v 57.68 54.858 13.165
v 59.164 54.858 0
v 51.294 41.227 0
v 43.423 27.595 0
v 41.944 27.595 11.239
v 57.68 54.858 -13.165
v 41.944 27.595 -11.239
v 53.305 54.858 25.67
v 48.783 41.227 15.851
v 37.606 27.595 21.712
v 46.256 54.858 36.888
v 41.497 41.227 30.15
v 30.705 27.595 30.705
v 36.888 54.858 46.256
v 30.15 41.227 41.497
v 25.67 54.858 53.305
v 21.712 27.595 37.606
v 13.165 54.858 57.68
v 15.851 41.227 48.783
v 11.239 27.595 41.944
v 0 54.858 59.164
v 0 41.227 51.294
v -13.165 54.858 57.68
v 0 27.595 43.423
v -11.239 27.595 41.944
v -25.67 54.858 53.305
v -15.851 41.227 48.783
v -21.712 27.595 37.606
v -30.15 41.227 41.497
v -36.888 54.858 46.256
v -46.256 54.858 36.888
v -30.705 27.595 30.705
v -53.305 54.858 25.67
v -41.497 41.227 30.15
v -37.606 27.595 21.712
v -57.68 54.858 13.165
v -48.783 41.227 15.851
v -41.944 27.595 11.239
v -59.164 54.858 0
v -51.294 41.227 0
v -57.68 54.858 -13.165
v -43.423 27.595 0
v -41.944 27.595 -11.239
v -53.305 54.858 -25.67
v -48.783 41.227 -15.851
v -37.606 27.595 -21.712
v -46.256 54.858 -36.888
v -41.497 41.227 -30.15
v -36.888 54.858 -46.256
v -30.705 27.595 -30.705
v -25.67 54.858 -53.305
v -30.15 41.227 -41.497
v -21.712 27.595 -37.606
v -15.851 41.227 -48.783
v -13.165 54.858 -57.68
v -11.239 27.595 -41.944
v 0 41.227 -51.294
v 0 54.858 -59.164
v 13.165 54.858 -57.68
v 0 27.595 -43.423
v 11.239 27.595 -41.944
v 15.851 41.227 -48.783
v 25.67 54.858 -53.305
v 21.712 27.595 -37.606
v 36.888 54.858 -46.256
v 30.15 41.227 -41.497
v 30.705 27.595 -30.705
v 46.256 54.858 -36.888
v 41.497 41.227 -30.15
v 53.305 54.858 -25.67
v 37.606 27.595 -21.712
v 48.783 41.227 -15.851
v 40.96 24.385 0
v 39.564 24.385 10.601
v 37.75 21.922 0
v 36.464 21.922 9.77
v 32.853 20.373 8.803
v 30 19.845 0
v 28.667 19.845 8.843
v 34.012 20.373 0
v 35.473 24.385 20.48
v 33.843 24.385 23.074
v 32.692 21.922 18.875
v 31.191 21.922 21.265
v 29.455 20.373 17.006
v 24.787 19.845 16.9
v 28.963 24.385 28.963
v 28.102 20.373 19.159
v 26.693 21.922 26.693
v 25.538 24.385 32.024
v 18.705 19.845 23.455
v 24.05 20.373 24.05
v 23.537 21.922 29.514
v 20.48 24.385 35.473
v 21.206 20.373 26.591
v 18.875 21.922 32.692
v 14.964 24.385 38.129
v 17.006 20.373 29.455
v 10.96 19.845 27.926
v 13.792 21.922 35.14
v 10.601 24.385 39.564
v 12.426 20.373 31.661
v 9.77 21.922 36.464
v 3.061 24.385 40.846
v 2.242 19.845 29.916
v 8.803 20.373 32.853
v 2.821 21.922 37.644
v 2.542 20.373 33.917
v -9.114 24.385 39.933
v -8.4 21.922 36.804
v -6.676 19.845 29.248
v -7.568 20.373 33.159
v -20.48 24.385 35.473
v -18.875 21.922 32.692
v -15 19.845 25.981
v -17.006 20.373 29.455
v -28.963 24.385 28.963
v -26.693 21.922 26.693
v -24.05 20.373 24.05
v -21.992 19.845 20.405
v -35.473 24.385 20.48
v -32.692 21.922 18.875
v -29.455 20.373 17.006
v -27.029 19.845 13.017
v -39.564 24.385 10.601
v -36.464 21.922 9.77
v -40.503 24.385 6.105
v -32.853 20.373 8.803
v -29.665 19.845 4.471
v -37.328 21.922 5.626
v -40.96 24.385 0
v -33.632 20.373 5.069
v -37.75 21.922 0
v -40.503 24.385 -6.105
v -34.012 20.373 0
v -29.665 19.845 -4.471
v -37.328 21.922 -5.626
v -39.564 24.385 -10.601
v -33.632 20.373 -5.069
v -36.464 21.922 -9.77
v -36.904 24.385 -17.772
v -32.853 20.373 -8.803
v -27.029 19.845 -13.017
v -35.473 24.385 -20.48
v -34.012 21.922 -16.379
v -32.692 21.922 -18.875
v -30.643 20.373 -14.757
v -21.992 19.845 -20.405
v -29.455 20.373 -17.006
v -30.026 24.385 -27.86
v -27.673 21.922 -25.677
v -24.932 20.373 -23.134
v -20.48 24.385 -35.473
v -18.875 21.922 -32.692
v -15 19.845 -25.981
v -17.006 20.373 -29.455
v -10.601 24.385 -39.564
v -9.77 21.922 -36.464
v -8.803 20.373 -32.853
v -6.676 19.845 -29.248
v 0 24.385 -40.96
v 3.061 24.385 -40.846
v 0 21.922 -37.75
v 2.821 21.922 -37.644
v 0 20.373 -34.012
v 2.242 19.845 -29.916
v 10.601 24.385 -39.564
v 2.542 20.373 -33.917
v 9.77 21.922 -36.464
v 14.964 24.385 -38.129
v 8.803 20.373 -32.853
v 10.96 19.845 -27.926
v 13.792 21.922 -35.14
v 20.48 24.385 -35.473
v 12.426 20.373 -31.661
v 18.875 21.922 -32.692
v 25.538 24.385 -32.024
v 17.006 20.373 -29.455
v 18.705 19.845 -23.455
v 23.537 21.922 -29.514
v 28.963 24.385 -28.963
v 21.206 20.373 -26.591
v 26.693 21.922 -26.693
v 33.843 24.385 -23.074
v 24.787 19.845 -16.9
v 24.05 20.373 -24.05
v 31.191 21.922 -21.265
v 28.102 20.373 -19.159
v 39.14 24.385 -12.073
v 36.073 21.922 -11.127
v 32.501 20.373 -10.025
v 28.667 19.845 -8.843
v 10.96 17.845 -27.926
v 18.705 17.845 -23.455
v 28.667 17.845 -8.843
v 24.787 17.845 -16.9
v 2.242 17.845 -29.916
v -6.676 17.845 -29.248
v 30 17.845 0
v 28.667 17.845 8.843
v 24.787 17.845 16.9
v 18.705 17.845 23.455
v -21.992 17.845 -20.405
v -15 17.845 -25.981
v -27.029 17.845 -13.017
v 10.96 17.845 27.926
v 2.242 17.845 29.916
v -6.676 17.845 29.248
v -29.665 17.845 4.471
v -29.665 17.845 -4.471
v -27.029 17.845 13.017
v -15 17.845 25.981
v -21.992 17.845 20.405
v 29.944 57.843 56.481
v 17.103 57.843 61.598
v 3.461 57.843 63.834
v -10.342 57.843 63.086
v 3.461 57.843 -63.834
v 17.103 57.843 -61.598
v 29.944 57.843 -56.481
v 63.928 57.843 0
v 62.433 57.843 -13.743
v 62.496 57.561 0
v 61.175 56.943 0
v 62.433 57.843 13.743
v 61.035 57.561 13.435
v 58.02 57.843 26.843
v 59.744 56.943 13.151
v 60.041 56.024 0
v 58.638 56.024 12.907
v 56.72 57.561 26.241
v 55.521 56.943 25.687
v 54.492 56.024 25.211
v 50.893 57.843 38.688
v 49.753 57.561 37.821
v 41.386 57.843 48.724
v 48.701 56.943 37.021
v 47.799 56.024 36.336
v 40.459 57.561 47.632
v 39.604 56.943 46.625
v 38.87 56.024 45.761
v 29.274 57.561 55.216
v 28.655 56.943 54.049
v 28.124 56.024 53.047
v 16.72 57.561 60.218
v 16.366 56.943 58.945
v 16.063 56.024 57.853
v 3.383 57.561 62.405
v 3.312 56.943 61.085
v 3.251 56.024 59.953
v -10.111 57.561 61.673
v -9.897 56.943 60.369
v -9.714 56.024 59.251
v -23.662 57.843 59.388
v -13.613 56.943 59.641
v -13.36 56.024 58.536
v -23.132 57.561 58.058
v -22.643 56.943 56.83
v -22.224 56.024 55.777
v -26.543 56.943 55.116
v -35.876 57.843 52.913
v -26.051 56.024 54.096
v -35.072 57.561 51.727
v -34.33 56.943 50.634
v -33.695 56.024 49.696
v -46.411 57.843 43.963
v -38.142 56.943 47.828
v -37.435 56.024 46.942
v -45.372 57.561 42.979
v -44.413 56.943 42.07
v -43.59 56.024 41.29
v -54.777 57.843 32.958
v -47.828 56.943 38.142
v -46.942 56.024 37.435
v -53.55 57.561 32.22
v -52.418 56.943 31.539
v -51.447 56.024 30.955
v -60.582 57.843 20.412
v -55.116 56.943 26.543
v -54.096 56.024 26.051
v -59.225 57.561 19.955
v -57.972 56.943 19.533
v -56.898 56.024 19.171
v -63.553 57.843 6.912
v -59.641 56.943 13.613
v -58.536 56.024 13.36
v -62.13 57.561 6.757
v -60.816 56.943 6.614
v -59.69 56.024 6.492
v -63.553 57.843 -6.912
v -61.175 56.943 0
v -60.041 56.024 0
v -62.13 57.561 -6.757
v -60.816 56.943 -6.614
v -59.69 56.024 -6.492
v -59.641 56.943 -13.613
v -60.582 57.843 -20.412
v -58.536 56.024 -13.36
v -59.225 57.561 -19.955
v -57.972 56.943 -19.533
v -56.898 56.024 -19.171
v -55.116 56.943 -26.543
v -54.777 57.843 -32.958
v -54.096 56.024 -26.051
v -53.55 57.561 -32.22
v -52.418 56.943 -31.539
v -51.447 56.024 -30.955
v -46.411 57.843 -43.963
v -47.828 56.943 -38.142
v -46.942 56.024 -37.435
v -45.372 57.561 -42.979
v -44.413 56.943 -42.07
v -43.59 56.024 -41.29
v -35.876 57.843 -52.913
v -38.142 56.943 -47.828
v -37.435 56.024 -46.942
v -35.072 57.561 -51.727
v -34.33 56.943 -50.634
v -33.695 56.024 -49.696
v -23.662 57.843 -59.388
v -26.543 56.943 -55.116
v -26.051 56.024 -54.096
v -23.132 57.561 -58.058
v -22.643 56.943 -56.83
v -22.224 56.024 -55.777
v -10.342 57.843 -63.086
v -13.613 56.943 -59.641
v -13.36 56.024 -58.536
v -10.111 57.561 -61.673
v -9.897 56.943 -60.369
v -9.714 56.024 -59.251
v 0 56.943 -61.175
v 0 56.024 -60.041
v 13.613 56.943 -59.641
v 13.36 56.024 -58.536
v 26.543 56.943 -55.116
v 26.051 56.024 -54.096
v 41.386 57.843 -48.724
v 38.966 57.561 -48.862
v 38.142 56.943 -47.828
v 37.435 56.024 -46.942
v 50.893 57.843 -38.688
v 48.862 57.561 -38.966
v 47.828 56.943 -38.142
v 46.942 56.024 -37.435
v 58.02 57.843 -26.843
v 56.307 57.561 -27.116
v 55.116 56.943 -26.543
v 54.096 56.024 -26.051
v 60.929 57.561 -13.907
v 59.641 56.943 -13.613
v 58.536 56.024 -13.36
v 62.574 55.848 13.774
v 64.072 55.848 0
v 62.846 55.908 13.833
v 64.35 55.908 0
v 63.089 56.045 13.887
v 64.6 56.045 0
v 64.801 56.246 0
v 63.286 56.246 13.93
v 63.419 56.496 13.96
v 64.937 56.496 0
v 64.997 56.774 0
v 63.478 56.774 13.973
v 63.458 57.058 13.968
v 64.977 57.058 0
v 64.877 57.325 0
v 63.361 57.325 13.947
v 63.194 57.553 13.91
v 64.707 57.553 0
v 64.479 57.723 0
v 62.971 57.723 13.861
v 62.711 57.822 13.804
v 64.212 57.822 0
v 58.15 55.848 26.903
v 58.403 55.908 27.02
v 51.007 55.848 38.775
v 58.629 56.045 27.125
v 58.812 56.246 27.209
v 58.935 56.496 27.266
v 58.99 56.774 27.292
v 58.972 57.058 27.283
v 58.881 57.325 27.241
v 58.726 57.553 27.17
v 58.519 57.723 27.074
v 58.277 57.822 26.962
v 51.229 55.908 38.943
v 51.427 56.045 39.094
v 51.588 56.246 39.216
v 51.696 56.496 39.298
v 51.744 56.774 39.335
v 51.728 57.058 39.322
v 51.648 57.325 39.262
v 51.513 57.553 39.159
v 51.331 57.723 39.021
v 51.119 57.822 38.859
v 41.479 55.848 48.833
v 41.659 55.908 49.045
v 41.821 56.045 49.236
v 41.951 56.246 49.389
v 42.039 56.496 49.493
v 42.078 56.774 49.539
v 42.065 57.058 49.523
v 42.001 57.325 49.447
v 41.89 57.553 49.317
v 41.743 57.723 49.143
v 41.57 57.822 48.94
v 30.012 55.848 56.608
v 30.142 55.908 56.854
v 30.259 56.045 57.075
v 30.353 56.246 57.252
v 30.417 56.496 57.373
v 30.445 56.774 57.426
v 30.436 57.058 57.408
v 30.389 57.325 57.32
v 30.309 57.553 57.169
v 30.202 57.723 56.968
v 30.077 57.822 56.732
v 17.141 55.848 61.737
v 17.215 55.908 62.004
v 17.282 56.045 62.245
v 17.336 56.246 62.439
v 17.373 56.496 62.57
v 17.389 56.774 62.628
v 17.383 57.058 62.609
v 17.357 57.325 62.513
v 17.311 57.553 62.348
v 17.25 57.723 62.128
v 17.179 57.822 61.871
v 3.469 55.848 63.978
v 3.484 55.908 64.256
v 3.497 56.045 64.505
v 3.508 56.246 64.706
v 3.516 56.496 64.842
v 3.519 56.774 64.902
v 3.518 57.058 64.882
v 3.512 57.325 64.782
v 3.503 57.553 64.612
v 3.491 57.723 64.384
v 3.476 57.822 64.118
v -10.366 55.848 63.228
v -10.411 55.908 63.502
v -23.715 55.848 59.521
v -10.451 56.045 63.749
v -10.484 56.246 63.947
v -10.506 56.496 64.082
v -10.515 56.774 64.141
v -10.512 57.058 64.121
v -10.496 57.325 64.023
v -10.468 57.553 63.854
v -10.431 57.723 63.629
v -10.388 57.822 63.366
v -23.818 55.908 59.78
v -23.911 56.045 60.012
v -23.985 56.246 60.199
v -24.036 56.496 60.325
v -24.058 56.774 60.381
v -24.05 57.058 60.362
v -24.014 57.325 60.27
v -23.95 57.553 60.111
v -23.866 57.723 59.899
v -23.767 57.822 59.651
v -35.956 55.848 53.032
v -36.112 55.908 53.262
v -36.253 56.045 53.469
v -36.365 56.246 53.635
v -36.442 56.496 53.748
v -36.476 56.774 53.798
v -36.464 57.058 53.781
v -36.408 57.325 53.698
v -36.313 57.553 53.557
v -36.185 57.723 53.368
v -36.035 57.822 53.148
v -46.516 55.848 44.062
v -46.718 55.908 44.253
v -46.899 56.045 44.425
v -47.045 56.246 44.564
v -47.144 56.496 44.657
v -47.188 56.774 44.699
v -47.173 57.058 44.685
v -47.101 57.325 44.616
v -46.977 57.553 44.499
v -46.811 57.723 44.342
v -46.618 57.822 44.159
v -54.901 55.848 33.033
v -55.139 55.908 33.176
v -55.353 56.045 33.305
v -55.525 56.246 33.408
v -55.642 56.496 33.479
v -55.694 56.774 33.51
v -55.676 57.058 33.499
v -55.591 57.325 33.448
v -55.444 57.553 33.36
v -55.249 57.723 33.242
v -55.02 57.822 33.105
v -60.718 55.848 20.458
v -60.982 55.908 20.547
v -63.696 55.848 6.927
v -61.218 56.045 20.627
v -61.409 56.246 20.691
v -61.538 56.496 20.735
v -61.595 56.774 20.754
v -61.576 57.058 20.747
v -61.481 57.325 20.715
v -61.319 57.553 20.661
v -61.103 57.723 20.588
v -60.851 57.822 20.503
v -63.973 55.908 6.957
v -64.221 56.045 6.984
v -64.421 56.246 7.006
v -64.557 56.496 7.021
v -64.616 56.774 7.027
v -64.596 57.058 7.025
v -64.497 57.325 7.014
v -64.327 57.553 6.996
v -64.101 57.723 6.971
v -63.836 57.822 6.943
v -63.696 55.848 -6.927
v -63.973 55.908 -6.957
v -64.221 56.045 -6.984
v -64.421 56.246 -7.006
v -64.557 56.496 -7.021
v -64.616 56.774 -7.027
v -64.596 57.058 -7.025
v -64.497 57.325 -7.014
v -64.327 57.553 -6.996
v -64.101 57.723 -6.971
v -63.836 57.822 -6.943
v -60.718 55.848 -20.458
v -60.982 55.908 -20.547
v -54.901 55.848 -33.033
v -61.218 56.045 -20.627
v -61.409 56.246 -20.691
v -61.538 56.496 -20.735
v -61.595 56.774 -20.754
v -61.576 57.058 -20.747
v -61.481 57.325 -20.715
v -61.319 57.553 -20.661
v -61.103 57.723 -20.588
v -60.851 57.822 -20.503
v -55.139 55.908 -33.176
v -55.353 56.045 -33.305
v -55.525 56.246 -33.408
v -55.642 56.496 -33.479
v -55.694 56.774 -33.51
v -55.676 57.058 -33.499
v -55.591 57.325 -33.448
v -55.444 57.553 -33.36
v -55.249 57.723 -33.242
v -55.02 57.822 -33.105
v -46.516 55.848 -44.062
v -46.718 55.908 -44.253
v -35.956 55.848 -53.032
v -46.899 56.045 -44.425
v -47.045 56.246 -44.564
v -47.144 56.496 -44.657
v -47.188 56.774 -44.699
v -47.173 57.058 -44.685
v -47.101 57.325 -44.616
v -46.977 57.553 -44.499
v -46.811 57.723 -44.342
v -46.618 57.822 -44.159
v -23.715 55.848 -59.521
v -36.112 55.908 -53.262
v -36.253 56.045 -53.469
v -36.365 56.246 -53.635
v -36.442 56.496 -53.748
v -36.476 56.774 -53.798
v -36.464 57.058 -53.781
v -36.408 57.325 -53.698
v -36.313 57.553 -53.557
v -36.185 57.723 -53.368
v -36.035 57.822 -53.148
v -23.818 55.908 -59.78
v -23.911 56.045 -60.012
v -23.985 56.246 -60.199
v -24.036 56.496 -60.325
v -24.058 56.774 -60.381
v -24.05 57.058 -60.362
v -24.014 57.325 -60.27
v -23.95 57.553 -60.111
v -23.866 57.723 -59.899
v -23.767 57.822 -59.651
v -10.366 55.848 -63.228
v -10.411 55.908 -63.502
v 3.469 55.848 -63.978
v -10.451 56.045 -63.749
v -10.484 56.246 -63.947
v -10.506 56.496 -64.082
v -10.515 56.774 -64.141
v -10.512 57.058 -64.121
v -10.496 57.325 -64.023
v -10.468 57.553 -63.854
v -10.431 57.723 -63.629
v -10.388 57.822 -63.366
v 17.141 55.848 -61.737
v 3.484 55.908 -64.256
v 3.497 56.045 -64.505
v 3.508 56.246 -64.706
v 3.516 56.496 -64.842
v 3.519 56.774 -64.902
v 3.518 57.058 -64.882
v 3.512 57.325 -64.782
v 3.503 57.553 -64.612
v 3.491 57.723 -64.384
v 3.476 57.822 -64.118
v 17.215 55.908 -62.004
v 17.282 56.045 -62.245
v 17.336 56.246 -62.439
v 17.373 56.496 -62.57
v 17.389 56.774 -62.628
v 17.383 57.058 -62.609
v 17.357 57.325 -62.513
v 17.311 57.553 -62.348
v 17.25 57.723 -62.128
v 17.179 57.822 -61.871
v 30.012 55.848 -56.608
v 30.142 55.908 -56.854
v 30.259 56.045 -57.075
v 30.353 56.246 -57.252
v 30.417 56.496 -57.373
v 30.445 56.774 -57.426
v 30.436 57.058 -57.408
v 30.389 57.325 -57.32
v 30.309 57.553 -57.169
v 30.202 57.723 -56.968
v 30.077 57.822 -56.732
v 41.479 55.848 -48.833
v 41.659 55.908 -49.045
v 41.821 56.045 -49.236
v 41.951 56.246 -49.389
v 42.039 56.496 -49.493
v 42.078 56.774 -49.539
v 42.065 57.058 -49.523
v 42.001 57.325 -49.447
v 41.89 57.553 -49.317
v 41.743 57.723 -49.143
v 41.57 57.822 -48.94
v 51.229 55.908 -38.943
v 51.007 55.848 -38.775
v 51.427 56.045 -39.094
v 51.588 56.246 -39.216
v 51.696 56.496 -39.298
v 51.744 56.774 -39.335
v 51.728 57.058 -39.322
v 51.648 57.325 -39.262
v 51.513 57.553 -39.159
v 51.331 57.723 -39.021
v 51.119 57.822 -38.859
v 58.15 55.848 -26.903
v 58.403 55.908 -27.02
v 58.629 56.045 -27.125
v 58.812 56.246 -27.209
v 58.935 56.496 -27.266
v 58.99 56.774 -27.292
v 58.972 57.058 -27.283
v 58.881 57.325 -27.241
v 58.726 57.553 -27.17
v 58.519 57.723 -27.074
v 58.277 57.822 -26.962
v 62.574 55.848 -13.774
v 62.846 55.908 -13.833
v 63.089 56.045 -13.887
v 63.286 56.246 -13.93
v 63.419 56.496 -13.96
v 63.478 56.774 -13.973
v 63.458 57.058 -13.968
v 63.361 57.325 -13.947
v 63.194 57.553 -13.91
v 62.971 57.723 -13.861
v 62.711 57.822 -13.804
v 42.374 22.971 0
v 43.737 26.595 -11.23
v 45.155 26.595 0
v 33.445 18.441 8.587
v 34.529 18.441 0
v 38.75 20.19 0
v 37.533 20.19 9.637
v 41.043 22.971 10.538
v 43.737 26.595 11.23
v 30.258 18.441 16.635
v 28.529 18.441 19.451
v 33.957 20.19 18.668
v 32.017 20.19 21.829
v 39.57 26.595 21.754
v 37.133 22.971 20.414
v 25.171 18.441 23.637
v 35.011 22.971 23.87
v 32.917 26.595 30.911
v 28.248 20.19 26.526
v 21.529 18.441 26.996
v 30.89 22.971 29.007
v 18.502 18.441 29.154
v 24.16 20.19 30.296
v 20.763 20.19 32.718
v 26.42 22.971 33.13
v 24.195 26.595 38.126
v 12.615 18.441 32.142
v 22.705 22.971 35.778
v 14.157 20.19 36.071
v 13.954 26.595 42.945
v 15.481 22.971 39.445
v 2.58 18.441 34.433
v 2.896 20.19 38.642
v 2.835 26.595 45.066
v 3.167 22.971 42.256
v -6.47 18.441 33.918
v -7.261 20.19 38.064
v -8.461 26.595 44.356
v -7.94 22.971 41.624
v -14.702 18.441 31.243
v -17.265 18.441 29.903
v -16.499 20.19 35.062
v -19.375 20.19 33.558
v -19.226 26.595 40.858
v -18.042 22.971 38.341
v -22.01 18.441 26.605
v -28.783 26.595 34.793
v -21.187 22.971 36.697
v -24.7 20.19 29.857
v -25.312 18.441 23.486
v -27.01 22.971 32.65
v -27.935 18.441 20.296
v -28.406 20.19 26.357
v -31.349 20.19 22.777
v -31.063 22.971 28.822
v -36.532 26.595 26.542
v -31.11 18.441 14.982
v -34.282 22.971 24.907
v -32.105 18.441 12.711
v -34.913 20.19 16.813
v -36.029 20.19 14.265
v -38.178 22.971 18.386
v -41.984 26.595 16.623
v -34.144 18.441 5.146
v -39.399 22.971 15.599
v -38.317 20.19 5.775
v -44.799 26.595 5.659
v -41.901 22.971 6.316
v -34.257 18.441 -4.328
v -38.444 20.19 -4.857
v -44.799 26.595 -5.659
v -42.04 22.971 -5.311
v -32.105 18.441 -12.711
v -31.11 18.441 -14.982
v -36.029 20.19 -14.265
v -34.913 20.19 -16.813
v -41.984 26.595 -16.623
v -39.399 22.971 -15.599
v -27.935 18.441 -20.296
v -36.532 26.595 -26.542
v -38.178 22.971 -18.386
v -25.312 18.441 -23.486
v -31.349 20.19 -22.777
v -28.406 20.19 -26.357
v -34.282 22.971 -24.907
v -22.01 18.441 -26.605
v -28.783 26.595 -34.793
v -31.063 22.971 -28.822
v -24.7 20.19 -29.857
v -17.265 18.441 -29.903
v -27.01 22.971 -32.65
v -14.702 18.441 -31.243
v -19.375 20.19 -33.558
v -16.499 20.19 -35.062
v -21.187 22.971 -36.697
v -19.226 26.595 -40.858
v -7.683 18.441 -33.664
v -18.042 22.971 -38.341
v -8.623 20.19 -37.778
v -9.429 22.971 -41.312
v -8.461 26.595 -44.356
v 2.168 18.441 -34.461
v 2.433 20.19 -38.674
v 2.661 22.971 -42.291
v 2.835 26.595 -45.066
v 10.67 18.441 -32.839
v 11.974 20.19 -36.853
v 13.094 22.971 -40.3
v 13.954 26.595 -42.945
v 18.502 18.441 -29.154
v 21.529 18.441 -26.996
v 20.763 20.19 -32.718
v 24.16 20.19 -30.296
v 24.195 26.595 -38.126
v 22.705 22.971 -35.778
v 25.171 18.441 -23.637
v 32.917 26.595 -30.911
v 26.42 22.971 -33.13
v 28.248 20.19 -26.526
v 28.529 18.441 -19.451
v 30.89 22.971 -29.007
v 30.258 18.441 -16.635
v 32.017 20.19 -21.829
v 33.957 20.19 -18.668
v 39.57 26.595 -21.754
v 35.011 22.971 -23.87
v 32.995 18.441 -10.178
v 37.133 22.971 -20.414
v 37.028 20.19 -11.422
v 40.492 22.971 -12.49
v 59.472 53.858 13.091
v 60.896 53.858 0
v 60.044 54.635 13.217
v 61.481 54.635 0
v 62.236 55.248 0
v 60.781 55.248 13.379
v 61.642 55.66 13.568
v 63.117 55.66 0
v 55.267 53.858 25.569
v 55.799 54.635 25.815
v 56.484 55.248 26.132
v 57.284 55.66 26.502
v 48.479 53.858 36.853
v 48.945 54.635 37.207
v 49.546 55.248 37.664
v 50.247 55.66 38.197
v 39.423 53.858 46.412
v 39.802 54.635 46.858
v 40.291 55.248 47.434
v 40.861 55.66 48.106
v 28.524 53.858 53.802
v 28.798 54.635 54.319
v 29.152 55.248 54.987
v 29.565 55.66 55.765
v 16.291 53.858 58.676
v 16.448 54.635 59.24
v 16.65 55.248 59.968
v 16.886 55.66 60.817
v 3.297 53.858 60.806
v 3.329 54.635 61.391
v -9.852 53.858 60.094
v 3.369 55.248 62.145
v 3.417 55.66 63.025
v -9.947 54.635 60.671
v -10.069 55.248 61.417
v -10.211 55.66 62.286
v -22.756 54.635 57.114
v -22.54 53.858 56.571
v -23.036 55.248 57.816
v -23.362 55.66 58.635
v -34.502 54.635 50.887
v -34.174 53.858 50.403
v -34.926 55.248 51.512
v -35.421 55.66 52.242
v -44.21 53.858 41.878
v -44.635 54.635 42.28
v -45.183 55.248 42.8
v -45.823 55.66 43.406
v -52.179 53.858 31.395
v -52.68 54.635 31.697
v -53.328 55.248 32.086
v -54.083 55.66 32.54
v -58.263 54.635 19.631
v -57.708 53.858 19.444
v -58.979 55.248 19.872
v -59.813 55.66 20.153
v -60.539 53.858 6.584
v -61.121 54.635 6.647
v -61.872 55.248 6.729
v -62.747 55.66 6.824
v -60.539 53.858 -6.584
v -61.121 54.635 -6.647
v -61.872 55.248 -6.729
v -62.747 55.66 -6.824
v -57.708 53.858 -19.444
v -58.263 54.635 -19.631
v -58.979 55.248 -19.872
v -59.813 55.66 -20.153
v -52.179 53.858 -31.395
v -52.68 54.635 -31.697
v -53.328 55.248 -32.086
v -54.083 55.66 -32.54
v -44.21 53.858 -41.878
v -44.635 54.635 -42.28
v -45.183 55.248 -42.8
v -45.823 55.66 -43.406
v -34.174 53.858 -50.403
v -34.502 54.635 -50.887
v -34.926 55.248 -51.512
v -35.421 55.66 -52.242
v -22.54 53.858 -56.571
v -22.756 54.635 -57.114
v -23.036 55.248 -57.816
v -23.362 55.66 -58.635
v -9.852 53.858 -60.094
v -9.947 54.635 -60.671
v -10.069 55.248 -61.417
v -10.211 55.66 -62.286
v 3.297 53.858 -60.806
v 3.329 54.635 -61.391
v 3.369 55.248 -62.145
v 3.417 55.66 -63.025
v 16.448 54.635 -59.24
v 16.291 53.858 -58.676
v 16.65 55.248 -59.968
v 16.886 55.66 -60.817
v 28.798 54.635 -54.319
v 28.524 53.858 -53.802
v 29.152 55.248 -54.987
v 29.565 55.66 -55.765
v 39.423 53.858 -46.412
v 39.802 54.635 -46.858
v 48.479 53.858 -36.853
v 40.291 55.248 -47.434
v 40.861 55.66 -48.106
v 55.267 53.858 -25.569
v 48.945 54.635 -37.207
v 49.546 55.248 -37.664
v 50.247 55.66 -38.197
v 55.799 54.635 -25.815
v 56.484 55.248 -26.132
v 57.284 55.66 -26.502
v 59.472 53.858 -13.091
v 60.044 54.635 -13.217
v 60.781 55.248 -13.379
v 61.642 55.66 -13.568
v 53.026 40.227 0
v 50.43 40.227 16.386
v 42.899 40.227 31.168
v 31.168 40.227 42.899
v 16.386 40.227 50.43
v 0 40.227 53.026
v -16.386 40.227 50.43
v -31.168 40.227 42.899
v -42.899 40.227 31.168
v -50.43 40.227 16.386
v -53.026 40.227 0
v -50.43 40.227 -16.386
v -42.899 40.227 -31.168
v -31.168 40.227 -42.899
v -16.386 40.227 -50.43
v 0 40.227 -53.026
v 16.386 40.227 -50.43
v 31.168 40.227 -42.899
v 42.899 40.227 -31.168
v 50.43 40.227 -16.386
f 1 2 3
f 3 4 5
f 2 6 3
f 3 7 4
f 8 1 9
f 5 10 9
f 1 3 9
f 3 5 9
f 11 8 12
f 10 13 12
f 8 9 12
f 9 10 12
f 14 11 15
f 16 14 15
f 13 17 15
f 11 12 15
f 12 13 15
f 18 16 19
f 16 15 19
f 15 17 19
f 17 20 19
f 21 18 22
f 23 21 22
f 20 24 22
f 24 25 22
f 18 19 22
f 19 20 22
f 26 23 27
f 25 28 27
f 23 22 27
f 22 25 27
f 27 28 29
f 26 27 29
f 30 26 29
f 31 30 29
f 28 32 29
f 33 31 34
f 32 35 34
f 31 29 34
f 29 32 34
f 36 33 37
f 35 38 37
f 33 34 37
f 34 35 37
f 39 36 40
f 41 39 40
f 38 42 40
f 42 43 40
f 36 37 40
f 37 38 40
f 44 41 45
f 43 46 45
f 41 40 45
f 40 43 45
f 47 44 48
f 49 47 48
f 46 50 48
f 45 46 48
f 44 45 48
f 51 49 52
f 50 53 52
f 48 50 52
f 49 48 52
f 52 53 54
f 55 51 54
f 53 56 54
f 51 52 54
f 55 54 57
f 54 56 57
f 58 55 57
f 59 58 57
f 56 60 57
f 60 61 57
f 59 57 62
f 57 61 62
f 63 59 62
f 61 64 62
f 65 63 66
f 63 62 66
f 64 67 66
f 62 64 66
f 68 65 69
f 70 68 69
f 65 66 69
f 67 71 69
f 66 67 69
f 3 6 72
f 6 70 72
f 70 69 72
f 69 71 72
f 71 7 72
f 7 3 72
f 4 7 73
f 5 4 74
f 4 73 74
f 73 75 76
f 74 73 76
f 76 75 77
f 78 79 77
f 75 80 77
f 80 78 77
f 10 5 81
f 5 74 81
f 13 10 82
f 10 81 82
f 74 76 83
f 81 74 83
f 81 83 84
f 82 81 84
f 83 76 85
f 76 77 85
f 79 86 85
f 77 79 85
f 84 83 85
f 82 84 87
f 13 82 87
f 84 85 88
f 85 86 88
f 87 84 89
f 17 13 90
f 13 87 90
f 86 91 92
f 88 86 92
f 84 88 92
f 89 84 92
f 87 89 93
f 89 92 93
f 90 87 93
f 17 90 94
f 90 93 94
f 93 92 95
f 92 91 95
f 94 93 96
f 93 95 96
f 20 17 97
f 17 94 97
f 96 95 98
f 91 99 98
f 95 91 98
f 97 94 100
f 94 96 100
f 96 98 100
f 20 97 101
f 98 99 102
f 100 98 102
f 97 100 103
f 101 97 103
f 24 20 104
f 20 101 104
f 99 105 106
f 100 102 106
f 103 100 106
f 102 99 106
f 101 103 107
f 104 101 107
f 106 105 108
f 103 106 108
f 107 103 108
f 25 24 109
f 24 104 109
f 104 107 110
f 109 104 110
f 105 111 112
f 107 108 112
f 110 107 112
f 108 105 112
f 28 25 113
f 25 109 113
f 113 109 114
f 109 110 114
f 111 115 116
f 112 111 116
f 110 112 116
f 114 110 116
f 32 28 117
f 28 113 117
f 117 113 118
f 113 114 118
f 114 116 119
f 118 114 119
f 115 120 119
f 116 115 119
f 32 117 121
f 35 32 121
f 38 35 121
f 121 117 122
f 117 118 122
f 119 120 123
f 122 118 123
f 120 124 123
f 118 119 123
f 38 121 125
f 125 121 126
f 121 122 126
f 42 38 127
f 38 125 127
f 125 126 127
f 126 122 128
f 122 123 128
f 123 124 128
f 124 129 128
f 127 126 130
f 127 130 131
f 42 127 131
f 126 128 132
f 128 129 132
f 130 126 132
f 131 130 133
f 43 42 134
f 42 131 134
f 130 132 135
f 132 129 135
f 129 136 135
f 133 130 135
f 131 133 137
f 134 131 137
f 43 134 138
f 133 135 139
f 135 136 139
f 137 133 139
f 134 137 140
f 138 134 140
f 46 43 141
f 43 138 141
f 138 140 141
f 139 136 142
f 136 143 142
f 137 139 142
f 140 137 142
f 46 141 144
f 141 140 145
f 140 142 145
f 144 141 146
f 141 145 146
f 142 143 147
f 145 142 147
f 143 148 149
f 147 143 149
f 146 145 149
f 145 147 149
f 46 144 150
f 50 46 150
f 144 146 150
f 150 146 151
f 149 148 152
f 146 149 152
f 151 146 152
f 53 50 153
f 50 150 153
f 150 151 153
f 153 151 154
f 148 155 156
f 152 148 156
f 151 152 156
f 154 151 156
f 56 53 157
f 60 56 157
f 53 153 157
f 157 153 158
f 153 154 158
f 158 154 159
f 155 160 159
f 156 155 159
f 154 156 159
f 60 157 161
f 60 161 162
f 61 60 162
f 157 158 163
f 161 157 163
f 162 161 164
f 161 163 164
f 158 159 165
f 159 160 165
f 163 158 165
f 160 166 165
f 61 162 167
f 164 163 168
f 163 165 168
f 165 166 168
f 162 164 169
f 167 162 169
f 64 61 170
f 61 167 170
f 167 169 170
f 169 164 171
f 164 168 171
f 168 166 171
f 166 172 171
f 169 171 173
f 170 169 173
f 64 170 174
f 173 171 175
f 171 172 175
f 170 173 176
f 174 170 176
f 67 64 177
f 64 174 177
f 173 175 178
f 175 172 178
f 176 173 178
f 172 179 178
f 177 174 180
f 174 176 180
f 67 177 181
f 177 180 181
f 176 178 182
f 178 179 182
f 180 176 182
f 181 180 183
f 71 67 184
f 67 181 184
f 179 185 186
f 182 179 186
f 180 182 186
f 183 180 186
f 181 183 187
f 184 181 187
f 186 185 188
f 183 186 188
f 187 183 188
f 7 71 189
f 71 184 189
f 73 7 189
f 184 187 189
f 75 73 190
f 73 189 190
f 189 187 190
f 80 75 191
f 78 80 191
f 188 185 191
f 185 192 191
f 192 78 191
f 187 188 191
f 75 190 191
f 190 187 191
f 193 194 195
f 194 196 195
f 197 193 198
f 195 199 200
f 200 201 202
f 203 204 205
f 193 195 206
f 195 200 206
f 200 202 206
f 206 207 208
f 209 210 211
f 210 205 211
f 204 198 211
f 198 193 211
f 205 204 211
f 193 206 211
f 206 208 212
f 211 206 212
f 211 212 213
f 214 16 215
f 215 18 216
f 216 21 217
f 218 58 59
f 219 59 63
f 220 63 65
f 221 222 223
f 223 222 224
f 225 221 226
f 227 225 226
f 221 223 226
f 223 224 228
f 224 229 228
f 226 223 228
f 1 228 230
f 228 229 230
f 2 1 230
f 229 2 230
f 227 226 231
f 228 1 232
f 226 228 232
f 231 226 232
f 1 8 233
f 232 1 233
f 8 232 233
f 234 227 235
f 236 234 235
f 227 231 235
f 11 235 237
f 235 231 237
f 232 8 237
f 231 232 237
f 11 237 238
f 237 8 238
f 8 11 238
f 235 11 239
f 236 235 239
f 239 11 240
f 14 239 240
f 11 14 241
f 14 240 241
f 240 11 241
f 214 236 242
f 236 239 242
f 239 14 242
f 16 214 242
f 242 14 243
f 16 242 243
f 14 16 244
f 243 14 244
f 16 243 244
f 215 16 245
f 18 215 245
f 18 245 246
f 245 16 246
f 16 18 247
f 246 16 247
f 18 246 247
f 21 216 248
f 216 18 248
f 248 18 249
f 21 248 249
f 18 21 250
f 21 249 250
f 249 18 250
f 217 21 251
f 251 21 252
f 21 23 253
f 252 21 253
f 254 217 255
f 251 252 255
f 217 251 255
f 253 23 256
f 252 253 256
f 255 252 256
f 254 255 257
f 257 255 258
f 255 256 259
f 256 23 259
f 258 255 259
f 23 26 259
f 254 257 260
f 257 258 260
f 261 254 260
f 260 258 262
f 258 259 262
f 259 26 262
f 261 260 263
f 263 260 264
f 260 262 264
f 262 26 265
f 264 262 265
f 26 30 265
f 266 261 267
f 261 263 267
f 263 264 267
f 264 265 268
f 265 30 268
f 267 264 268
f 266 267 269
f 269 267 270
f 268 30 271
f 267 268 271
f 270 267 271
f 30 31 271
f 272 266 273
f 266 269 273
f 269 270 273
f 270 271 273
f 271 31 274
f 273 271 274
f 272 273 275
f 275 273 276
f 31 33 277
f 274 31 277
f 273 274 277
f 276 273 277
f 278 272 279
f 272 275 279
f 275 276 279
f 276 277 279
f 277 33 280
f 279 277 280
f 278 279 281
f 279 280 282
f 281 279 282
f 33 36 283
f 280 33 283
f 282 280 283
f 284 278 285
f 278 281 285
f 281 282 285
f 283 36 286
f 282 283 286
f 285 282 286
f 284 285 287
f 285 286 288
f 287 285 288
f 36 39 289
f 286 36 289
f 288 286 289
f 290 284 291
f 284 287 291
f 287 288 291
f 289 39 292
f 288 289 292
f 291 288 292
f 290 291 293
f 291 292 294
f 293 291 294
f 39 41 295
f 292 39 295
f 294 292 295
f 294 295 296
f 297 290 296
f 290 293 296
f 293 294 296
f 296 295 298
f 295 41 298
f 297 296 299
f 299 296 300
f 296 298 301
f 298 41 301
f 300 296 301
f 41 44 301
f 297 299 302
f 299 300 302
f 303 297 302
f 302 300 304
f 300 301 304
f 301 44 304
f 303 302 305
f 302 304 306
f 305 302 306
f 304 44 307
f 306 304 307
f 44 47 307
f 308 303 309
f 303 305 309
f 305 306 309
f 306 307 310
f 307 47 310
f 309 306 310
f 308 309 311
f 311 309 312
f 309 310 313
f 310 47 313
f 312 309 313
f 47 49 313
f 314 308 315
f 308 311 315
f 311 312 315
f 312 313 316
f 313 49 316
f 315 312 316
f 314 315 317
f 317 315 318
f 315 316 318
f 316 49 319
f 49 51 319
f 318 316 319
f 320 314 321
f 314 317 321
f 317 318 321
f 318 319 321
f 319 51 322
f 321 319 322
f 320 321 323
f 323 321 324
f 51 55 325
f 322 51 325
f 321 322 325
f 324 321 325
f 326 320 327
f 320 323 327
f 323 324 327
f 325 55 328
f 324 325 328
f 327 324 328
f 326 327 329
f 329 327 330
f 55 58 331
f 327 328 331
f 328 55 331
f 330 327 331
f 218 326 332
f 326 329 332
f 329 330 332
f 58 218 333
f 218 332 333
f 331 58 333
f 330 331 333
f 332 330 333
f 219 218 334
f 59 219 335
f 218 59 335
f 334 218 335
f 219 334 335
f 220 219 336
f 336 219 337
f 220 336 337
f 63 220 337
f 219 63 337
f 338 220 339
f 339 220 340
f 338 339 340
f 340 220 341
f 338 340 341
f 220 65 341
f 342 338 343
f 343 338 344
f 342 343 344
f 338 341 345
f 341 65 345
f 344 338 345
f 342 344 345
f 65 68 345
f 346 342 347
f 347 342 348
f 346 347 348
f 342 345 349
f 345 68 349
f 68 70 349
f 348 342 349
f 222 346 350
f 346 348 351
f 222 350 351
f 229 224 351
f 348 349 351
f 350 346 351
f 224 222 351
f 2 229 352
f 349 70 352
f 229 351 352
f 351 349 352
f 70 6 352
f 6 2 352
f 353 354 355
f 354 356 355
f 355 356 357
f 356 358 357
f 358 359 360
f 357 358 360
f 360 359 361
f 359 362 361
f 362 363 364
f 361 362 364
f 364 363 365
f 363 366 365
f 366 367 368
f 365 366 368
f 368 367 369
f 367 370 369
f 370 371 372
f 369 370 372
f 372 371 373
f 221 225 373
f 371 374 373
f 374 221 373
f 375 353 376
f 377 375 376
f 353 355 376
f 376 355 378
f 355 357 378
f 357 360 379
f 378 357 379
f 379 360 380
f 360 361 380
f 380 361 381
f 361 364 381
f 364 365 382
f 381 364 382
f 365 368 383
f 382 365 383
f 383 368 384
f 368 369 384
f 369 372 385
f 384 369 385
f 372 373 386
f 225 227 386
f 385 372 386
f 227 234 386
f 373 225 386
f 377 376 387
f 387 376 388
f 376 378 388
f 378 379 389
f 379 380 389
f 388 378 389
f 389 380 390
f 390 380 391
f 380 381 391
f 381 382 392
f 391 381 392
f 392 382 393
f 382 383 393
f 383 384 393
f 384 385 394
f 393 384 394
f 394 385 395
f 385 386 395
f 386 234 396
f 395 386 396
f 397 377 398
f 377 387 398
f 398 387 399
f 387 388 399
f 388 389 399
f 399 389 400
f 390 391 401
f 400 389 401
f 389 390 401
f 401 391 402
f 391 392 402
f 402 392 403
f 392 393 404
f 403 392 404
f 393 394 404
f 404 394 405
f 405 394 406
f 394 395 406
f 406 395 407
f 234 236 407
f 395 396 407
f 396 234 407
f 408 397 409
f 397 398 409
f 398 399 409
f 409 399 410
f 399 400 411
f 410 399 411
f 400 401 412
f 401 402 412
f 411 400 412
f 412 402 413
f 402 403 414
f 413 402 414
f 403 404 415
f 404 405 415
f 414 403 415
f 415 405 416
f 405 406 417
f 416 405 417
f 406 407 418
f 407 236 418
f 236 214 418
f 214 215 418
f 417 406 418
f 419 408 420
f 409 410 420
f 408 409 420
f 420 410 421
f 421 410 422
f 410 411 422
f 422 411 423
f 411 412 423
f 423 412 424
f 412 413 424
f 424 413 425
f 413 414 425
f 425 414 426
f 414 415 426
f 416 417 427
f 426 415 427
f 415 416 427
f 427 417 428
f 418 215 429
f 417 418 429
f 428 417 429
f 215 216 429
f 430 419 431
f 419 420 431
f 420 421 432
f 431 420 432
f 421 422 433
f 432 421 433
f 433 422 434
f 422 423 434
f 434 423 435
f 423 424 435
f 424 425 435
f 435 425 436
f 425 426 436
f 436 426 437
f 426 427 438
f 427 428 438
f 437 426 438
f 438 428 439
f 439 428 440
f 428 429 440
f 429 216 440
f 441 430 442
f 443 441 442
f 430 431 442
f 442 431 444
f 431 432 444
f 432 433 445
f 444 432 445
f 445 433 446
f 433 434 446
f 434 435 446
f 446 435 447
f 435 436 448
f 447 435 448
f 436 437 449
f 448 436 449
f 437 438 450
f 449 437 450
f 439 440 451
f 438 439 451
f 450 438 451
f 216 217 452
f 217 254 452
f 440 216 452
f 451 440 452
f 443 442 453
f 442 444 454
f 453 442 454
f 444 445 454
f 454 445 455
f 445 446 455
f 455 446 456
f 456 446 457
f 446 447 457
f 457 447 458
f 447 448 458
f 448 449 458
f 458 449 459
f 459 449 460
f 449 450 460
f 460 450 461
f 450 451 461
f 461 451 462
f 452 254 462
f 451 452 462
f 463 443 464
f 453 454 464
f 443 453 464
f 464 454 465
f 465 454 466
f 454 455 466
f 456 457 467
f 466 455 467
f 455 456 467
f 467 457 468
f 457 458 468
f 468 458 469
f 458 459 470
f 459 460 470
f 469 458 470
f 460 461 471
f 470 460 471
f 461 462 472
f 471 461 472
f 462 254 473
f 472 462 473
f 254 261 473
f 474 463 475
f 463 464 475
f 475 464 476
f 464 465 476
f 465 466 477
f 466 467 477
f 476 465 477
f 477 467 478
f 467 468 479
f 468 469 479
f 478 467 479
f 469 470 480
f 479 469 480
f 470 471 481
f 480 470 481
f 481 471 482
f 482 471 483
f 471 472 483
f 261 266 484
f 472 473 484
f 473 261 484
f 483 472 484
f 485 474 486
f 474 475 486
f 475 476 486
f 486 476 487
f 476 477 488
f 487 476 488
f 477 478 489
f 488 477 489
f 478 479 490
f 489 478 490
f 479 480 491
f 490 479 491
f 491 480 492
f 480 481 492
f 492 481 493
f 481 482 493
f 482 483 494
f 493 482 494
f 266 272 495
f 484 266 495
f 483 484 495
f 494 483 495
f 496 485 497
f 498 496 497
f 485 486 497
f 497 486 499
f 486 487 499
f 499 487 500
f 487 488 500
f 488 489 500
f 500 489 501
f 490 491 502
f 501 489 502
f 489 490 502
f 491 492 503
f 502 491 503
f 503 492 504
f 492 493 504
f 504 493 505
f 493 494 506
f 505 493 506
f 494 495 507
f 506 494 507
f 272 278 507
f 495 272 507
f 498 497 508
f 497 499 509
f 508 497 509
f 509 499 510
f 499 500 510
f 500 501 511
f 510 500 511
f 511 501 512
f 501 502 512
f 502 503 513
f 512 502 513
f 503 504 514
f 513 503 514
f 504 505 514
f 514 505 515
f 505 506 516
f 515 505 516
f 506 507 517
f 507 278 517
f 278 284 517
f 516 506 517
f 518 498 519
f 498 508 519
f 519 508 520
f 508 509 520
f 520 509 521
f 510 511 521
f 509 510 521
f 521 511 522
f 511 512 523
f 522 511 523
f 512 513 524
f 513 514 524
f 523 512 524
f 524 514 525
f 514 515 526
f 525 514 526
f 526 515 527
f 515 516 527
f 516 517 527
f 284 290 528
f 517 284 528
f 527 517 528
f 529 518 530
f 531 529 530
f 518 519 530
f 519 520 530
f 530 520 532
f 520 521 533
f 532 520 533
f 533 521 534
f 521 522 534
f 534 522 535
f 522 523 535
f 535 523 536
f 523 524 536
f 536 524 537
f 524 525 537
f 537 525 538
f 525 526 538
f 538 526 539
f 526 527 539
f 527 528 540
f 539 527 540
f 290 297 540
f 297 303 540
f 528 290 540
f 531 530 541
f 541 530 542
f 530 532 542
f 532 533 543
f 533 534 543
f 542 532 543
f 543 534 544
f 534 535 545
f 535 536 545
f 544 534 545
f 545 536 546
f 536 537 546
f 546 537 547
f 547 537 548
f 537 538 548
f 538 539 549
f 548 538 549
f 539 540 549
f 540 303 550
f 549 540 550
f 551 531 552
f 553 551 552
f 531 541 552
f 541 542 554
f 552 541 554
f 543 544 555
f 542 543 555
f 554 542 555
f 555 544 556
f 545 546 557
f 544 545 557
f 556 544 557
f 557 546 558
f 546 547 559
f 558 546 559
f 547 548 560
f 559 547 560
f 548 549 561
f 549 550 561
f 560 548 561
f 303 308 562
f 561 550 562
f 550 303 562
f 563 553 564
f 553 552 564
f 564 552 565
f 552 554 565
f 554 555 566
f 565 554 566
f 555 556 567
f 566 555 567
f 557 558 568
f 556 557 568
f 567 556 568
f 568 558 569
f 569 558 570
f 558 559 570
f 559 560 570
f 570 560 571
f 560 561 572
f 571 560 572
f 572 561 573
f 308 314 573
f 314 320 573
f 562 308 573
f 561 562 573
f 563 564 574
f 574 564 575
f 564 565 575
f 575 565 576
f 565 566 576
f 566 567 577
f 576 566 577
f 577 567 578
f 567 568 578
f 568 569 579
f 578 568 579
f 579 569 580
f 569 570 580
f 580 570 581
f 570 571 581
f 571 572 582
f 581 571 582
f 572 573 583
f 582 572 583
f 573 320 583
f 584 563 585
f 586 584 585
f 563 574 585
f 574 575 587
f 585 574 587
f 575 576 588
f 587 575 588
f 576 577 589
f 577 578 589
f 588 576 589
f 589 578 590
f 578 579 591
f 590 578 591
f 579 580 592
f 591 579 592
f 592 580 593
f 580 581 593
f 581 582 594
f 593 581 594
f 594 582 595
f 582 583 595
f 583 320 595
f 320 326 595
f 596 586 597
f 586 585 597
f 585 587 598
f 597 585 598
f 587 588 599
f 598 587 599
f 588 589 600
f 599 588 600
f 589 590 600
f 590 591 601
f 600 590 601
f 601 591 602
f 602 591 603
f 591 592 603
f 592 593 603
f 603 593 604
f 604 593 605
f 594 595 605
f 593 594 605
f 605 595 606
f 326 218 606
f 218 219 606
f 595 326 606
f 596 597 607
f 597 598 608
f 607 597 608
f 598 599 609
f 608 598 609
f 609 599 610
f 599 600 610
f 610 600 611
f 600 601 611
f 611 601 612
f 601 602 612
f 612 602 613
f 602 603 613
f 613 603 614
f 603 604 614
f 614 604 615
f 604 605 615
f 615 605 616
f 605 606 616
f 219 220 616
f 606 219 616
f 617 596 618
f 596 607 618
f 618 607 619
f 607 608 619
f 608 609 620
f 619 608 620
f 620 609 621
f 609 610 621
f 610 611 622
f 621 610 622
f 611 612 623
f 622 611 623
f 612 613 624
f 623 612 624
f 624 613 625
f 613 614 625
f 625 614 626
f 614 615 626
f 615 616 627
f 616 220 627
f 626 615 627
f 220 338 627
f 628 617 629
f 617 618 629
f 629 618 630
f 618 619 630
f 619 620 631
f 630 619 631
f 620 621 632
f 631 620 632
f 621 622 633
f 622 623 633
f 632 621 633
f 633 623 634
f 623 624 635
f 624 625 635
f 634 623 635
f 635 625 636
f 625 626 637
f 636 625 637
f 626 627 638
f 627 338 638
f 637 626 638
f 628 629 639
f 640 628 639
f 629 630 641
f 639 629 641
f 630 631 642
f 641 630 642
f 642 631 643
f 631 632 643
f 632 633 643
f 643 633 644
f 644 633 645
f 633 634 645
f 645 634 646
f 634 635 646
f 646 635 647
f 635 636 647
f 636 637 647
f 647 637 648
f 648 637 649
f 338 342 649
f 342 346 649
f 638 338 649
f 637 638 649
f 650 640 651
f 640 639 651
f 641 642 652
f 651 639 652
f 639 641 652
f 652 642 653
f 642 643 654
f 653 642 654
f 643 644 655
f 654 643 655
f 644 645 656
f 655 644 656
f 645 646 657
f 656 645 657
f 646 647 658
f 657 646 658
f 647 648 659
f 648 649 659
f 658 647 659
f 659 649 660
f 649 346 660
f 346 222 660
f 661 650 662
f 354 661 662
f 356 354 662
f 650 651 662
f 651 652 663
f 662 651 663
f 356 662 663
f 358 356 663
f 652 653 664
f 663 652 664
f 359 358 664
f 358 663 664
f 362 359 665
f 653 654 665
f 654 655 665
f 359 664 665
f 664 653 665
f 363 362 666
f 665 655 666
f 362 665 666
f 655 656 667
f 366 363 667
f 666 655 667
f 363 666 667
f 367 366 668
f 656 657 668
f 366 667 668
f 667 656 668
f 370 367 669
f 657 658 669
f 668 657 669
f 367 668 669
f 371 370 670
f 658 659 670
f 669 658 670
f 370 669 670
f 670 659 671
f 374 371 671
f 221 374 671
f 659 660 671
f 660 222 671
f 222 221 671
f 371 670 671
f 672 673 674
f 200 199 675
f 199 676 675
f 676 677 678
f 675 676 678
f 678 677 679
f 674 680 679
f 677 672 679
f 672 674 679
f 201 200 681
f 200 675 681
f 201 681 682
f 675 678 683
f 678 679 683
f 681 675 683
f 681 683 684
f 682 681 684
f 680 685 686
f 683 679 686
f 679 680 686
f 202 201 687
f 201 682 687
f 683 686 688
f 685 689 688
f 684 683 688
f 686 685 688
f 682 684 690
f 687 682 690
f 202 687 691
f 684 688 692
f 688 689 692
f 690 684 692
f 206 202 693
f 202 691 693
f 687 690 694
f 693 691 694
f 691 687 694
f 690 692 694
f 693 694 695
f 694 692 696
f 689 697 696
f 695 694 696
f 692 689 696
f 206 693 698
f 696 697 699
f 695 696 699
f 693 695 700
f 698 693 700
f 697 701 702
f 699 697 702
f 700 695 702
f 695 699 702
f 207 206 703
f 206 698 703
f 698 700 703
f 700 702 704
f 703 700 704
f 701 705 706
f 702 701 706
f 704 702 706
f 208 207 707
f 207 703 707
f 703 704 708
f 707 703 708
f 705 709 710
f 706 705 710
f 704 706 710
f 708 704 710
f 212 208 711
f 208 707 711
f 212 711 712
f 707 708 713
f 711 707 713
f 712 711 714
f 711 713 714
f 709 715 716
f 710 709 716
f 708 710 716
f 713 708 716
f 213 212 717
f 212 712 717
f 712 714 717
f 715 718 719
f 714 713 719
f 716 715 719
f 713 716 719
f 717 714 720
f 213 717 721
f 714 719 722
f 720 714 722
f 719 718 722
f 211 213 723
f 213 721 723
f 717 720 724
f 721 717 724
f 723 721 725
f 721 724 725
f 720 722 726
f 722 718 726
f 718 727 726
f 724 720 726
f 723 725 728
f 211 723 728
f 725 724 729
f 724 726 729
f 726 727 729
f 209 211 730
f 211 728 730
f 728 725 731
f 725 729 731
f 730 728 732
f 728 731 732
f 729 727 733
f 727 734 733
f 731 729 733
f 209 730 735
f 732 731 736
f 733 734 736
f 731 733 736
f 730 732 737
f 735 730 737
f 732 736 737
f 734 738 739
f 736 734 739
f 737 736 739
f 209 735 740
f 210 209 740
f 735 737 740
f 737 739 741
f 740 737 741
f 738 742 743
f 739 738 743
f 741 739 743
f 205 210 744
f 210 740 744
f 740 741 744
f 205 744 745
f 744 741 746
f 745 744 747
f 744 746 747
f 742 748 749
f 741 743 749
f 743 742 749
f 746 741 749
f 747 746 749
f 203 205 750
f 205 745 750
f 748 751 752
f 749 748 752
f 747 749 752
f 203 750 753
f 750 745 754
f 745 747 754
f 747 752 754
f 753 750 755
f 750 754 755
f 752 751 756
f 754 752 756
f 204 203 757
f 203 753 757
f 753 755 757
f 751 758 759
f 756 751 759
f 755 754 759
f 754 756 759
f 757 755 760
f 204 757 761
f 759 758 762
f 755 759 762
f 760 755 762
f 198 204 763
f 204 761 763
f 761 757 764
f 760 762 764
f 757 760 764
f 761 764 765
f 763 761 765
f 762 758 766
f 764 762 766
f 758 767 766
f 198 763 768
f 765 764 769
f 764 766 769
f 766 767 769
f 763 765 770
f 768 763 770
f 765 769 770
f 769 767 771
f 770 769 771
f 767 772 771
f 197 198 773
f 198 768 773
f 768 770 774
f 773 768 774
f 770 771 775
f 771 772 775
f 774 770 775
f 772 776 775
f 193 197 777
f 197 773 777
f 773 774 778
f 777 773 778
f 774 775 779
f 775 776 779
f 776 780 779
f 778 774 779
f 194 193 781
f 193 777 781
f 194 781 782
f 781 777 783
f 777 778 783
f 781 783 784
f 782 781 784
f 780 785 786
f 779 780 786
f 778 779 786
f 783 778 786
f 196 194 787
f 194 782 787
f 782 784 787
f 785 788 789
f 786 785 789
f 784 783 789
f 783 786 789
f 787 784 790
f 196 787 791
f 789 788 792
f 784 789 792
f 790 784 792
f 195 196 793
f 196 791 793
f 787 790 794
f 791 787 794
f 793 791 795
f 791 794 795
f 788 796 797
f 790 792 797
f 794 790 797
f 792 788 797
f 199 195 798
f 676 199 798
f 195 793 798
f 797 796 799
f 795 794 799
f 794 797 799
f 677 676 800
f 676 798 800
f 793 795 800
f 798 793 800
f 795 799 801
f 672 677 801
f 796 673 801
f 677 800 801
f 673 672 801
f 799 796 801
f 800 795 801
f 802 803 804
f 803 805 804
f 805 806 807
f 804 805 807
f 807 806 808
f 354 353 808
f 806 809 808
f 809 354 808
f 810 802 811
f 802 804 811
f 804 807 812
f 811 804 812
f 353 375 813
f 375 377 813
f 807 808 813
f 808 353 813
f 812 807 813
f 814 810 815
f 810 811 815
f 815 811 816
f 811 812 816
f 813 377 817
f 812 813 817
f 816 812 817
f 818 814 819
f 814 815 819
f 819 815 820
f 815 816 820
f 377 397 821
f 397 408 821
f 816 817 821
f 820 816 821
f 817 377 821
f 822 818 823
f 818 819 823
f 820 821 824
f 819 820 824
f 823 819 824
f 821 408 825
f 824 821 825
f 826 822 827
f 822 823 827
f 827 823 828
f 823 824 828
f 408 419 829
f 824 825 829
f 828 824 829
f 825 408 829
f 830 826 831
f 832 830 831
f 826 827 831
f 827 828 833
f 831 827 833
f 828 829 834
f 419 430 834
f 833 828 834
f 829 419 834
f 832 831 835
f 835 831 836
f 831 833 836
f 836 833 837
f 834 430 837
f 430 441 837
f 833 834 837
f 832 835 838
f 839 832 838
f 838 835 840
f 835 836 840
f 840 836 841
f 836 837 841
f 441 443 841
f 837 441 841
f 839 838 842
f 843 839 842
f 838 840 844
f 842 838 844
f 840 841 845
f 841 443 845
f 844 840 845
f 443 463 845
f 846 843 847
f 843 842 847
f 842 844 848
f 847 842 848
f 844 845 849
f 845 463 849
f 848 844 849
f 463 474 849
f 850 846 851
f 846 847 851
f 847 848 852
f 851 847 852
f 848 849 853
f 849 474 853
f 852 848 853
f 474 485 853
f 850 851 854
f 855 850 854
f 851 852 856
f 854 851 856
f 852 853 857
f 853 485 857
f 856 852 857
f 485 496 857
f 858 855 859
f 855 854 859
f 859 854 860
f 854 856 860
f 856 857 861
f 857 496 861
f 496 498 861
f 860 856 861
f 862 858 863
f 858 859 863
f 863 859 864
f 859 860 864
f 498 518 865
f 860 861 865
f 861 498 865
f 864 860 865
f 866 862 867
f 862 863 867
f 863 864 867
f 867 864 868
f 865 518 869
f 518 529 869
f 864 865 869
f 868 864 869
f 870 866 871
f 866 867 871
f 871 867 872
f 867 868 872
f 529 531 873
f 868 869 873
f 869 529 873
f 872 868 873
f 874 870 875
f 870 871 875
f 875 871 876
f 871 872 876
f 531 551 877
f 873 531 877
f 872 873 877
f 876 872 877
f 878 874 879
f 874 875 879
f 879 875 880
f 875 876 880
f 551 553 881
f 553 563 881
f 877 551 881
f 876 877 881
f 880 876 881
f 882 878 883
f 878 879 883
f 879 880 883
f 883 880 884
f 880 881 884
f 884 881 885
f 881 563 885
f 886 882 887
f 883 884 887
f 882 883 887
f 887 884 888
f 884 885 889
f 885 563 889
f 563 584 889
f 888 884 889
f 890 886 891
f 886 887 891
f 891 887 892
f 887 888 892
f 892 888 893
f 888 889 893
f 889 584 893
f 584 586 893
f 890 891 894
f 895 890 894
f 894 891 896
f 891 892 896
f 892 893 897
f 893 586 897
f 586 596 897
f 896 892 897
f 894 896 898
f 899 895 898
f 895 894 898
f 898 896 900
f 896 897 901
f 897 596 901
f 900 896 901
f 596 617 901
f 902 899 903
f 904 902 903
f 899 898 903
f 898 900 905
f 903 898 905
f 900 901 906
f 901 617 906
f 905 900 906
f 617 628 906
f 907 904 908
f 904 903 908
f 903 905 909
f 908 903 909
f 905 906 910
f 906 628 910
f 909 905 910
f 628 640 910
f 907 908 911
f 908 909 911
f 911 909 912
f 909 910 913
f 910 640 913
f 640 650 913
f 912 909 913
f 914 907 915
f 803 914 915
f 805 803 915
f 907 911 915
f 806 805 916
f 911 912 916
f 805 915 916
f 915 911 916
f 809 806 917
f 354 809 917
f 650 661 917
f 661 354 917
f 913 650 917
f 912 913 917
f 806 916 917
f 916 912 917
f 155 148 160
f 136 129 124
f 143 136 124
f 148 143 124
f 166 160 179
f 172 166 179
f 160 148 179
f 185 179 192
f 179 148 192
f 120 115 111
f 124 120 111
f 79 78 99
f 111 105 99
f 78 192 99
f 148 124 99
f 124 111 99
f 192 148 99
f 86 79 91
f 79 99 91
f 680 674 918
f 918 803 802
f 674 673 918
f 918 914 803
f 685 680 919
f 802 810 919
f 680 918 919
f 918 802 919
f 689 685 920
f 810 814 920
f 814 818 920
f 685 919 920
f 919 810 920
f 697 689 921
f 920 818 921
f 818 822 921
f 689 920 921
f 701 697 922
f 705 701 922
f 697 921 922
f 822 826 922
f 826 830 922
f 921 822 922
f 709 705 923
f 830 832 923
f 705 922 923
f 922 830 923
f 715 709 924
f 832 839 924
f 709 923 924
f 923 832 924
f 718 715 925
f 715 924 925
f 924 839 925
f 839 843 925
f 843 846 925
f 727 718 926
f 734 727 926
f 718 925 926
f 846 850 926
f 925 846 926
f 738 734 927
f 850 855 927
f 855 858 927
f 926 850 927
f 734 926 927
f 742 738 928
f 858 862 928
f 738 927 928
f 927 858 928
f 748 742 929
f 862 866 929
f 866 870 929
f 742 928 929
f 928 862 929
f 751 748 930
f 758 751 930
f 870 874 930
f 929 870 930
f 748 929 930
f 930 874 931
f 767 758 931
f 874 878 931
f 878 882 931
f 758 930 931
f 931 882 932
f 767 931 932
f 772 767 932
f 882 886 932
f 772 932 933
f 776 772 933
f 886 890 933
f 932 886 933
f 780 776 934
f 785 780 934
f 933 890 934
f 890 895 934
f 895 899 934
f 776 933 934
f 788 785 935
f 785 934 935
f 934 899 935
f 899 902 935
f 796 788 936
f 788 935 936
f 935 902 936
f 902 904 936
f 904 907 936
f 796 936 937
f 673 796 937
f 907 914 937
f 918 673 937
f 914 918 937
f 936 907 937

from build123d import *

# Parameters (mm, degrees)
SCALE1_SCALE = 0.5


with BuildPart() as part:
    # Sketch1 → Revolve1 (revolve)
    with BuildSketch(Plane.XY):
        with BuildLine():
            Line((0, 0), (60, 0))
            ThreePointArc((60, 0), (77.5, 4.689110868), (90.310889132, 17.5))
            Line((90.310889132, 17.5), (121.791448663, 72.025928557))
            ThreePointArc((121.791448663, 72.025928557), (124.472789107, 74.805615606), (128.143930379, 76.005185711))
            ThreePointArc((128.143930379, 76.005185711), (129.994814289, 78.143930379), (127.856069621, 79.994814289))
            ThreePointArc((127.856069621, 79.994814289), (122.349357715, 78.19545913), (118.327347047, 74.025928557))
            Line((118.327347047, 74.025928557), (86.846787517, 19.5))
            ThreePointArc((86.846787517, 19.5), (75.5, 8.153212483), (60, 4))
            Line((60, 4), (0, 4))
            Line((0, 4), (0, 0))
        make_face()
    revolve(axis=Axis((0, 4, 0), (0, -1, 0)))


with BuildPart() as part_1:
    # Scale1: scaled about (0, 35.690345414, 0)
    add(part.part.scale(SCALE1_SCALE).moved(Location((0, 17.845172707, 0))))


solid = part_1.part
